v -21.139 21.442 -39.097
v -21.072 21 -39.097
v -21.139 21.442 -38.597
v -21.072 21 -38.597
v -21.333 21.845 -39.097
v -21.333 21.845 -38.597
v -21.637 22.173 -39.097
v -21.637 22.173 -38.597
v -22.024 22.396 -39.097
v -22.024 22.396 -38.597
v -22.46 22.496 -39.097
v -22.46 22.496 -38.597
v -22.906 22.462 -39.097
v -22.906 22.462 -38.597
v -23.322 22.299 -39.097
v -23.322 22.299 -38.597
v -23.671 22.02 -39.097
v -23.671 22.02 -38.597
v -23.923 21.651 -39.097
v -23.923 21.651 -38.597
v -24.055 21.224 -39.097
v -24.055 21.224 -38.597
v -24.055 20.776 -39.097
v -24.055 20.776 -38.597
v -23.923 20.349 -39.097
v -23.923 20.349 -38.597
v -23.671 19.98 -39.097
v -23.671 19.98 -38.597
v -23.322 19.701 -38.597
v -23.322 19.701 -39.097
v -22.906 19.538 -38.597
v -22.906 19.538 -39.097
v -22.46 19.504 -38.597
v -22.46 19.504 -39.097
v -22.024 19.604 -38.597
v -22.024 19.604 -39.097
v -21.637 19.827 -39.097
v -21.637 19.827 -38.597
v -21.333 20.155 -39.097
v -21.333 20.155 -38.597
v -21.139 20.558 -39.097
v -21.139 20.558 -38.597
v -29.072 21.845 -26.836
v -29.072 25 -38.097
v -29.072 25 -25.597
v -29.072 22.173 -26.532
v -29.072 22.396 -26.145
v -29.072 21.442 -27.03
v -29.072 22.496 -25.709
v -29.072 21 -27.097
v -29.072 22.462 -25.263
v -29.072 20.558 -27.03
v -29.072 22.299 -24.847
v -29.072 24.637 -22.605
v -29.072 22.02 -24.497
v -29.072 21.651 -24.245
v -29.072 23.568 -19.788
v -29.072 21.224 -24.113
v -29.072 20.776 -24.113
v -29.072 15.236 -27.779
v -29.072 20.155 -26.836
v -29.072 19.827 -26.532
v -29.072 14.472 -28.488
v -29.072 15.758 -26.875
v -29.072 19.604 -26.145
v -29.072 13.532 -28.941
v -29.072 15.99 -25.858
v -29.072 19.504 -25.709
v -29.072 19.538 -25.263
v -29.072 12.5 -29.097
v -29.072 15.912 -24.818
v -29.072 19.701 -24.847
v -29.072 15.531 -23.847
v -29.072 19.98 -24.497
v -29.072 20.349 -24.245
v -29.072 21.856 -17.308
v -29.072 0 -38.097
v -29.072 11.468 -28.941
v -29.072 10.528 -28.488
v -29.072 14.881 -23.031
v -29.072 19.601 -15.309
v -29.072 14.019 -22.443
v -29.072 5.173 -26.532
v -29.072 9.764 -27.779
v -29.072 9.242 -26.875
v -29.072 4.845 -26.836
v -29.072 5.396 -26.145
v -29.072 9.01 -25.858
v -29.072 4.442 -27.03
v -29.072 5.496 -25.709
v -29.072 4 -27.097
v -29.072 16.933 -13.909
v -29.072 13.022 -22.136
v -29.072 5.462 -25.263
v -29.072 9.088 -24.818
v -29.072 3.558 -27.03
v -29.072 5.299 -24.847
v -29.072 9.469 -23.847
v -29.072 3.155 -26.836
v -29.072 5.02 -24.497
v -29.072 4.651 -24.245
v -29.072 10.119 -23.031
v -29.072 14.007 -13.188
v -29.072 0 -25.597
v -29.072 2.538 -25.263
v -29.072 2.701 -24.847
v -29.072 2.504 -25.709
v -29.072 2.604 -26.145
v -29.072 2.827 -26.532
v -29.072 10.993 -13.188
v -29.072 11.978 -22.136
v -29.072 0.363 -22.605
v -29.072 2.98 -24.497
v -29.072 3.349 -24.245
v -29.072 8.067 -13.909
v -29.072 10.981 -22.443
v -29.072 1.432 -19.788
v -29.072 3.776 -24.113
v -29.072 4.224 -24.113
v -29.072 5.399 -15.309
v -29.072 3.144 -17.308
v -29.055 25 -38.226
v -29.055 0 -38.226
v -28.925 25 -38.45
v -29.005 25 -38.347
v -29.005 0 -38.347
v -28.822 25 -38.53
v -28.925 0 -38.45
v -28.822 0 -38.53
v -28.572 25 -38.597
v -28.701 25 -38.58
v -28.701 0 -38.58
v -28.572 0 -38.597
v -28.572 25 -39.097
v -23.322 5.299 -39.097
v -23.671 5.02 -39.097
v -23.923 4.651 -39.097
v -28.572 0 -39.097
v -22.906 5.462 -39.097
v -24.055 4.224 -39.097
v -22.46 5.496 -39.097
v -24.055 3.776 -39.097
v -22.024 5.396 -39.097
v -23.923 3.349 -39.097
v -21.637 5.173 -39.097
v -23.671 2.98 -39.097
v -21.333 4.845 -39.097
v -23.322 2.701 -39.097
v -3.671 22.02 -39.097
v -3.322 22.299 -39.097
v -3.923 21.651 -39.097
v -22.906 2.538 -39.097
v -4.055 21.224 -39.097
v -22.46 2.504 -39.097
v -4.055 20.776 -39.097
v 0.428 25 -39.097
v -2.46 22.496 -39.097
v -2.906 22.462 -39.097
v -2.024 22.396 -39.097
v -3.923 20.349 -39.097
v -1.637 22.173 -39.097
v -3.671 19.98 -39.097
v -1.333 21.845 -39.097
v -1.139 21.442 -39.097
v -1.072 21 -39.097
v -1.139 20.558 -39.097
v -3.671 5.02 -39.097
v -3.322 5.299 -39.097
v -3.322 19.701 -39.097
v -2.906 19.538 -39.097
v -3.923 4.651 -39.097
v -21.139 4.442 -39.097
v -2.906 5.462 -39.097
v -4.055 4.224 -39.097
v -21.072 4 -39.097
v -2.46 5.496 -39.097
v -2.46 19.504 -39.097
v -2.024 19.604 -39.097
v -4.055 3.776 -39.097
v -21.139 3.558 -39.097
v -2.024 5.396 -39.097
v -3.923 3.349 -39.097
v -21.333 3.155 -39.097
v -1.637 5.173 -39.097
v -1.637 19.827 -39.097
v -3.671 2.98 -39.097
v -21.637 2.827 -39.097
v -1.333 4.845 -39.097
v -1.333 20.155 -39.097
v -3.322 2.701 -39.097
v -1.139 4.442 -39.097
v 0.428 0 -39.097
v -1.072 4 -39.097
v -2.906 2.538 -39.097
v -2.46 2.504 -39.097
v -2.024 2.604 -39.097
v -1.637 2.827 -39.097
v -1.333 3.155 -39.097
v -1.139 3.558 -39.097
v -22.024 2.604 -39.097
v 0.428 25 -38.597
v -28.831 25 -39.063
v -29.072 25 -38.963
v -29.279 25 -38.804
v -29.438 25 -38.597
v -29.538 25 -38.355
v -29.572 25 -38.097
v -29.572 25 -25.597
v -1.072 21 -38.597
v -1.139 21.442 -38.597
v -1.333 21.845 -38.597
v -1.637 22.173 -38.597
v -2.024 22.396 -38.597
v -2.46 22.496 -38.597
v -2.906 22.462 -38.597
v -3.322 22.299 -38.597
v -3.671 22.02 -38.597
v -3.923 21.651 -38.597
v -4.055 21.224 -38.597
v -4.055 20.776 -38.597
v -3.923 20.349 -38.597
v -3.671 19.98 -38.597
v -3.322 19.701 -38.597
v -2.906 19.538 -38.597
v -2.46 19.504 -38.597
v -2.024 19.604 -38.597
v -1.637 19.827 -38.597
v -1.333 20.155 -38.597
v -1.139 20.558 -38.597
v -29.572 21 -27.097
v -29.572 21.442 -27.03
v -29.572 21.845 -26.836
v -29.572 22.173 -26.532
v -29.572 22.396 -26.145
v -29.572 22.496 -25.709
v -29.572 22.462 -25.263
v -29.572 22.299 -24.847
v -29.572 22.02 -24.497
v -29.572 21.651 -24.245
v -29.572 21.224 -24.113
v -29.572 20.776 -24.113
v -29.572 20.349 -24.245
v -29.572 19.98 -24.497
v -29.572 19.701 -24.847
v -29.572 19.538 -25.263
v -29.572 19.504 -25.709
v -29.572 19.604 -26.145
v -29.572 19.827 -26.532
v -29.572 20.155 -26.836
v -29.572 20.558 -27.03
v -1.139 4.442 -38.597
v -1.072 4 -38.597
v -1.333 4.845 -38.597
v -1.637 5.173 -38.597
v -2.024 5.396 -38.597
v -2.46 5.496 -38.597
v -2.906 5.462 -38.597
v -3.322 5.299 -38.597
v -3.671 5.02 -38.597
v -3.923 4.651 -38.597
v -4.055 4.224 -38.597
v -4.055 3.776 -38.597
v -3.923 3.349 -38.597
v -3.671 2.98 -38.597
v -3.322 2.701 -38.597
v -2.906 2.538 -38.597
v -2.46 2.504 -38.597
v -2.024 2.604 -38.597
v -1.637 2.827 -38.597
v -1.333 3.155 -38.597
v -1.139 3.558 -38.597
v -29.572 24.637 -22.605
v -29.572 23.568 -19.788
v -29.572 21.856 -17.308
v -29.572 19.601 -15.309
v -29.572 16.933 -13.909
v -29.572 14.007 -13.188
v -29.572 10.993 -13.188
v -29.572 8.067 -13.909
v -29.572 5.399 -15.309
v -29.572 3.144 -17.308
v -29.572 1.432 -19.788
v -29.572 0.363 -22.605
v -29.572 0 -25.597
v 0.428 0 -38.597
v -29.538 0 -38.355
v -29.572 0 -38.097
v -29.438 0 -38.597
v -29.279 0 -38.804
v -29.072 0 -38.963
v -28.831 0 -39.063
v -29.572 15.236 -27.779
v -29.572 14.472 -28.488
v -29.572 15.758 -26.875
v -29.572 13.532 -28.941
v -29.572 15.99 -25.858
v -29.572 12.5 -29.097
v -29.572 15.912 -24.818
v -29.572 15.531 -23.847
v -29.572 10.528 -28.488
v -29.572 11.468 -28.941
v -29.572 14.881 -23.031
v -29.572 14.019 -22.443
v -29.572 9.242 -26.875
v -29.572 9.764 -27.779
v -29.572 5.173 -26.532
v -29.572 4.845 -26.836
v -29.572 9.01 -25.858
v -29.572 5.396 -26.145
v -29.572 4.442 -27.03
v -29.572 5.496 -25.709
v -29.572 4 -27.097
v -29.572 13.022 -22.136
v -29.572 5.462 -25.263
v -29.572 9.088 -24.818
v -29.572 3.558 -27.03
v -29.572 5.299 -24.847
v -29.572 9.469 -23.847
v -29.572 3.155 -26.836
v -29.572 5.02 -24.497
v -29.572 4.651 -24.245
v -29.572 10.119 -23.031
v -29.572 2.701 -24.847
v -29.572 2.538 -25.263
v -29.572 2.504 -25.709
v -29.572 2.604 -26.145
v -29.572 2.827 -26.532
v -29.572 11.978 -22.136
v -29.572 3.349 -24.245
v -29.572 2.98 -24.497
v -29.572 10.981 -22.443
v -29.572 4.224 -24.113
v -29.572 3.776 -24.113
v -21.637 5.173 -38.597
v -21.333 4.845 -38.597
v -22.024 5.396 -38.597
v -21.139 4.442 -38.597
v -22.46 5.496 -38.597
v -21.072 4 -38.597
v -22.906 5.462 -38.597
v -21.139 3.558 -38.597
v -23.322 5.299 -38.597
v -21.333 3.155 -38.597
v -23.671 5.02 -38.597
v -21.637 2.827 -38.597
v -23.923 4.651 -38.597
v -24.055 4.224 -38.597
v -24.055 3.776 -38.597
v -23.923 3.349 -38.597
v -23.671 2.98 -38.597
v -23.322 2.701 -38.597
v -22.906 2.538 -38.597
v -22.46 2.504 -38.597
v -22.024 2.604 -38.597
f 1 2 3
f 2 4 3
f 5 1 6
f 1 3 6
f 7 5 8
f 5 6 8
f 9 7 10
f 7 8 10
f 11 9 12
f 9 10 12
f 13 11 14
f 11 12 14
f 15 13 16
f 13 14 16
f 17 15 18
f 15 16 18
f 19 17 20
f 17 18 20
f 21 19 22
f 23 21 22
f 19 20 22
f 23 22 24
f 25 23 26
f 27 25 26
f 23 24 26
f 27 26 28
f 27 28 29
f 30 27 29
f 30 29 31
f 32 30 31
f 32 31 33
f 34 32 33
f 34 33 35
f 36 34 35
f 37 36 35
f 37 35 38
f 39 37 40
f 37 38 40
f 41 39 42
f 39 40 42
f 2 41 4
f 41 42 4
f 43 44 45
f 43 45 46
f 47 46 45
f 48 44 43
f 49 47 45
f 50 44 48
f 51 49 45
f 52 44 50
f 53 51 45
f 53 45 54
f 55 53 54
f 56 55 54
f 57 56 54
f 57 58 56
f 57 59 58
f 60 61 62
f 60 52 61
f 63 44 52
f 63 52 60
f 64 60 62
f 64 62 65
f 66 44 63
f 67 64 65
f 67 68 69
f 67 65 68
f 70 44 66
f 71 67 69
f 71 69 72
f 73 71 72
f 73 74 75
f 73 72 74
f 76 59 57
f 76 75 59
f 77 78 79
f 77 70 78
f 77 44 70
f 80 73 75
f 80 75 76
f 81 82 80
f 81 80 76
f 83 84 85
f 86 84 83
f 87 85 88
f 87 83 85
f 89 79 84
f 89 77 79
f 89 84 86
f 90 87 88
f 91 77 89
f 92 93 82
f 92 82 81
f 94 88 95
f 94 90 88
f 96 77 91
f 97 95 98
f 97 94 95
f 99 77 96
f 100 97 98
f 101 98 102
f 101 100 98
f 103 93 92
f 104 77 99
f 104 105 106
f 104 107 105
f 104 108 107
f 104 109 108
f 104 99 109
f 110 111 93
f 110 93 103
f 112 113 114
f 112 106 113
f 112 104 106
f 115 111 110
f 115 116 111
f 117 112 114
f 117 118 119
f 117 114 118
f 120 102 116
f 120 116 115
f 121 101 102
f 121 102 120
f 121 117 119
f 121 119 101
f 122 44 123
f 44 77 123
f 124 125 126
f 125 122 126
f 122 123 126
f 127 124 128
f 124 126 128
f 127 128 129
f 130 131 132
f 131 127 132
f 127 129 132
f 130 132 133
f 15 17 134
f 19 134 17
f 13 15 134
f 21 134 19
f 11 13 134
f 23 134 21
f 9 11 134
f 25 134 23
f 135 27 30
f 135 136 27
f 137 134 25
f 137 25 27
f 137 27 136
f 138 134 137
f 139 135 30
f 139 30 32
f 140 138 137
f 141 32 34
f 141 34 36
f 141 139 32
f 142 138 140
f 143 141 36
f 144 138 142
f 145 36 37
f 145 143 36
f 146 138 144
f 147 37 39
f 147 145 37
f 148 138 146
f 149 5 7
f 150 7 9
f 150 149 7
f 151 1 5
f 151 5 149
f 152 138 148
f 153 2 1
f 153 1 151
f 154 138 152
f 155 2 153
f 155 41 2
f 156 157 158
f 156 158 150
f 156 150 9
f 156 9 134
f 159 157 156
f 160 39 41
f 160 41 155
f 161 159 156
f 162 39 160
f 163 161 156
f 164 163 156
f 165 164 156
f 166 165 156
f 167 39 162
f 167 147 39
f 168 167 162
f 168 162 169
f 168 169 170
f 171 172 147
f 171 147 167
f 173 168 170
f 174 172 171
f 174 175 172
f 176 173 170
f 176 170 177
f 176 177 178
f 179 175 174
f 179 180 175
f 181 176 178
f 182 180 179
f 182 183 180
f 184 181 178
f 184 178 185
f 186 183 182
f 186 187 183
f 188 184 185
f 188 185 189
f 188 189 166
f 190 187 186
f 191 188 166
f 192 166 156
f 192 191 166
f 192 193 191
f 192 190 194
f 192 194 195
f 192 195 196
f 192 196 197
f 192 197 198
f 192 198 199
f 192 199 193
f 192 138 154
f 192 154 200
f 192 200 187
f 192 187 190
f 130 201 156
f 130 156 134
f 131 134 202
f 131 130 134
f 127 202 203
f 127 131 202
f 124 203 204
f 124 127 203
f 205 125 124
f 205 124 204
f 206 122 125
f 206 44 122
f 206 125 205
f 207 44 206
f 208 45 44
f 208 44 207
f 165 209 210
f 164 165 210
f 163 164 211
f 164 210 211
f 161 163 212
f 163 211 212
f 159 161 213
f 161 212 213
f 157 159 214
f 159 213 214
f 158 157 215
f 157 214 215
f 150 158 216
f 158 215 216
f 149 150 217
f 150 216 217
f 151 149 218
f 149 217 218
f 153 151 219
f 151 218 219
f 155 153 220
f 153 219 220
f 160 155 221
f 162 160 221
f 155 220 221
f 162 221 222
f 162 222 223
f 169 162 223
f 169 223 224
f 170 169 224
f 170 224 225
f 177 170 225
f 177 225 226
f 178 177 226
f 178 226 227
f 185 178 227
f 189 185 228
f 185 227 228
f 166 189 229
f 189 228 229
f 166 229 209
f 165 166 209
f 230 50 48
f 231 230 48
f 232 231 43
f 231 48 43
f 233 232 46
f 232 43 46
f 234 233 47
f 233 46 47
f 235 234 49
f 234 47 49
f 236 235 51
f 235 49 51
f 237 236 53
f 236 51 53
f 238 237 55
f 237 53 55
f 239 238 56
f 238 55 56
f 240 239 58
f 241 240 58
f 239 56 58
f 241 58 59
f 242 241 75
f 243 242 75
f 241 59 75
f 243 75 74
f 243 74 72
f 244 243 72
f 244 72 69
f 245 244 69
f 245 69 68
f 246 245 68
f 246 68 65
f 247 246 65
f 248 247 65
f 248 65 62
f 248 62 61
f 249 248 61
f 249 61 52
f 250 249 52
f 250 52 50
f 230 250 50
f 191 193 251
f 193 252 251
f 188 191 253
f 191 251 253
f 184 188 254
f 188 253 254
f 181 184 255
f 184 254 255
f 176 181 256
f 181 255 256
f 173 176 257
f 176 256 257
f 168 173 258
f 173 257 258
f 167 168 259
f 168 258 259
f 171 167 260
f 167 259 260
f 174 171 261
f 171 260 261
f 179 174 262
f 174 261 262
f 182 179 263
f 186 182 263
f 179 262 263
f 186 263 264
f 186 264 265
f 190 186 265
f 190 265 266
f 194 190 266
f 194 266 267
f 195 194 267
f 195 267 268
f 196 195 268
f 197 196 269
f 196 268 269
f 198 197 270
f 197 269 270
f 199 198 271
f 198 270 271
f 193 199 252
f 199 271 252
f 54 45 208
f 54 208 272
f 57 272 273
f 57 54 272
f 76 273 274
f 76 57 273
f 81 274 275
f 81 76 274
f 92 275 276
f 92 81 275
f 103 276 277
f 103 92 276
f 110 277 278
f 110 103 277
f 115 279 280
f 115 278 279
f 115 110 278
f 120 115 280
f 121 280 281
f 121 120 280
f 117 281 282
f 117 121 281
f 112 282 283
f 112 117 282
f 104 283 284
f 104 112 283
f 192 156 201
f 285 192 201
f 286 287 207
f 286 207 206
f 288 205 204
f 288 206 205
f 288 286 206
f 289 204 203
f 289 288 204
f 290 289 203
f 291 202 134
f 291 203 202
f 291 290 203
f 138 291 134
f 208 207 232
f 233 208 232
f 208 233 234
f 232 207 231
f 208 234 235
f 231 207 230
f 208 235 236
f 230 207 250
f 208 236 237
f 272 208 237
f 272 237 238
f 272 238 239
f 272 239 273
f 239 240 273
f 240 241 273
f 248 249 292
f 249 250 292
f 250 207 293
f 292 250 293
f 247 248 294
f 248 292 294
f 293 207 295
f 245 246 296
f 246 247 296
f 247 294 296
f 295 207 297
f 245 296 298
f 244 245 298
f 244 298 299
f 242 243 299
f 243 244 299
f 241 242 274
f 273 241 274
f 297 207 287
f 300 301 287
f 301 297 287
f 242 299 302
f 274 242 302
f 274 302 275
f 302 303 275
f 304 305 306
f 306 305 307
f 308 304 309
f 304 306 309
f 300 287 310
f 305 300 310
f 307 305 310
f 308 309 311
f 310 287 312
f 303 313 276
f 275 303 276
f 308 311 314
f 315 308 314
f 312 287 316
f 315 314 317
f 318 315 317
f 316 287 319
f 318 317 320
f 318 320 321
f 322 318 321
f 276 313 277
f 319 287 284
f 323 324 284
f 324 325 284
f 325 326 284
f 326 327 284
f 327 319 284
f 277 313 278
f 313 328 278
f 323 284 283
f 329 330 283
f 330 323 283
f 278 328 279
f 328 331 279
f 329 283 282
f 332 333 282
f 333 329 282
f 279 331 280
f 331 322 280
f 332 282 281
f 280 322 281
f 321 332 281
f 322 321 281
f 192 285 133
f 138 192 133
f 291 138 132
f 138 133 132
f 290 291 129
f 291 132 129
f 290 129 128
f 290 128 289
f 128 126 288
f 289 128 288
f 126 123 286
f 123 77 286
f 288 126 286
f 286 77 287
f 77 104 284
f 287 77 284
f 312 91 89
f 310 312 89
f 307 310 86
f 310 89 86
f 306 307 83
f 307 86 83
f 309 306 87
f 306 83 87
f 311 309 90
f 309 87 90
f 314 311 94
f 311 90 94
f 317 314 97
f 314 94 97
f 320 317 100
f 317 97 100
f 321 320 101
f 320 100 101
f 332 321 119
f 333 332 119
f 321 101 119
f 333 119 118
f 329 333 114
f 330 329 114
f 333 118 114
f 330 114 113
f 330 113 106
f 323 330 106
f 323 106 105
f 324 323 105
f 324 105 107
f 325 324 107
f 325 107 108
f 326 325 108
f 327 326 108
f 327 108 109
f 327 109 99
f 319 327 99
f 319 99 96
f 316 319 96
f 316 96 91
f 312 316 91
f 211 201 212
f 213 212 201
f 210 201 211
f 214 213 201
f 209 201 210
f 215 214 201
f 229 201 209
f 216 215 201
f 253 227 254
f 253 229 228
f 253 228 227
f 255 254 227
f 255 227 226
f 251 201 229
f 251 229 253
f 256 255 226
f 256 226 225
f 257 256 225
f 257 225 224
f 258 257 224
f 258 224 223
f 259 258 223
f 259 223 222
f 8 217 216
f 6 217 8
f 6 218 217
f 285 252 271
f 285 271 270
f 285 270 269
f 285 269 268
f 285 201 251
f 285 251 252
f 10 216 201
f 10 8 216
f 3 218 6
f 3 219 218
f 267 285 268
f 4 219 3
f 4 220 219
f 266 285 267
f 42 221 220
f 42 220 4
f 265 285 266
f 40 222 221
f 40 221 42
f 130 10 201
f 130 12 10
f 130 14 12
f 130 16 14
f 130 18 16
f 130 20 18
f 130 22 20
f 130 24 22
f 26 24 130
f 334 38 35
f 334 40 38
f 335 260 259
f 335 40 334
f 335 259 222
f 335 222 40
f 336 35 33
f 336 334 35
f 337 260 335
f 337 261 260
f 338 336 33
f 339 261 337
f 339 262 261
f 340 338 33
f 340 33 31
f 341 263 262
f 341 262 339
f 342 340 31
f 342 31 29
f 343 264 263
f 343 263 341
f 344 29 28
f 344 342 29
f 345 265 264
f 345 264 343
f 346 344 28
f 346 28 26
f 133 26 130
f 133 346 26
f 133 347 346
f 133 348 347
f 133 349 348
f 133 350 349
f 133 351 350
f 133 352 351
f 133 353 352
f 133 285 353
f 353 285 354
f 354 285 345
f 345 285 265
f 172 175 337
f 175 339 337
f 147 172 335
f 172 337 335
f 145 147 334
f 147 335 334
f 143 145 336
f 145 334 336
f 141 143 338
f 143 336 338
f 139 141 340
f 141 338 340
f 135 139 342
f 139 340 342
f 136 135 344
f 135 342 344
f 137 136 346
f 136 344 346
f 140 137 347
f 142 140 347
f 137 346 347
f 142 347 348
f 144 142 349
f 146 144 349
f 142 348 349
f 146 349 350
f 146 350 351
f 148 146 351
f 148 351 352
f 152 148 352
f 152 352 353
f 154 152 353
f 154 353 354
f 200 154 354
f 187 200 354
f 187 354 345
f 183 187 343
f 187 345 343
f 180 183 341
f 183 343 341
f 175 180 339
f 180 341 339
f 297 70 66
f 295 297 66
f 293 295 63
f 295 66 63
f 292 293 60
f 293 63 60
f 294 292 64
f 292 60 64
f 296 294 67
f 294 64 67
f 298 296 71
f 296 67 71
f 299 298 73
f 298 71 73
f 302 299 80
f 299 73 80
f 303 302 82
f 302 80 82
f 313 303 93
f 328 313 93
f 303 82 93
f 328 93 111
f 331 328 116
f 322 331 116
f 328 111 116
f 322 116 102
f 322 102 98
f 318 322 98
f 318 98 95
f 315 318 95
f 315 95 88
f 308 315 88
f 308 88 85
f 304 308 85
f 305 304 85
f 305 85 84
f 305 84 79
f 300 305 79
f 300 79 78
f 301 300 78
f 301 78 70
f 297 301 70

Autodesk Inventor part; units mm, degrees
ref_plane "YZ Plane" through (0, 0, 0) normal (1, 0, 0) x (0, 1, 0)
ref_plane "XZ Plane" through (0, 0, 0) normal (0, 1, 0) x (-1, 0, 0)
ref_plane "XY Plane" through (0, 0, 0) normal (0, 0, 1) x (1, 0, 0)
sketch "草圖1" plane through (0, 0, 0) normal (0, 1, 0) x (-1, 0, 0)
  line L0 (29.5719, -39.0966) -> (29.5719, -13.0966)
  line L1 (29.5719, -39.0966) -> (-0.4281, -39.0966)
  point P0 (0, 0)
  dimension "d0" = 26
  dimension "d2" = 90
  dimension "d3" = 30
contour flange "輪廓線凸緣1" sketch "草圖1" thickness 0.5 bend radius 0.5 width 25 along (0, 1, 0) mid plane no both sides no wall seen from (-29.5719, 0, -26.0966) lies toward (1, 0, 0) curves L0 L1
bend "折彎1"
corner "轉角1"
sketch "草圖2" plane through (-29.0719, 0, -13.0966) normal (1, 0, 0) x (0, 0, -1)
  circle A0 centre (12.5, 12.5) radius 12.5
  line L0 (0, 25) -> (25, 25) projected
  line L1 (0, 0) -> (0, 25) projected
  line L2 (0, 0) -> (25, 0) projected
  point P0 (-13.0966, 0)
  point P1 (0, 12.5)
  point P2 (12.5, 25)
  point P3 (12.5, 0)
  dimension "d15" = 25
extrude "擠出1" cut sketch "草圖2" against normal up to surface (0.5 mm away) contours A0 L1 L0 | L2 L1 A0
sketch "草圖3" plane through (-29.0719, 0, -38.0966) normal (1, 0, 0) x (0, 0, -1)
  arc A0 (-12.5, 25) -> (-12.5, 0) centre (-12.5, 12.5) ccw projected
  circle A1 centre (-12.5, 21) radius 1.5
  circle A2 centre (-12.5, 4) radius 1.5
  point P0 (-38.0966, 0)
  dimension "d18" = 3
  dimension "d19" = 17
  dimension "d20" = 8.5
  dimension "d21" = 3
extrude "擠出2" cut sketch "草圖3" against normal up to surface (0.5 mm away)
sketch "草圖4" plane through (0.4281, 0, -38.5966) normal (0, 0, 1) x (1, 0, 0)
  circle A0 centre (-23, 21) radius 1.5
  circle A1 centre (-3, 21) radius 1.5
  circle A2 centre (-23, 4) radius 1.5
  circle A3 centre (-3, 4) radius 1.5
  line L0 (0, 0) -> (0, 25) projected
  line L1 (-3, 21) -> (-3, 4)
  line L2 (-3, 12.5) -> (-13.1347, 12.5)
  line L3 (-29, 25) -> (0, 25) projected
  point P0 (-0.4281, 0)
  dimension "d24" = 20
  dimension "d25" = 3
  dimension "d26" = 3
  dimension "d27" = 3
  dimension "d28" = 3
  dimension "d29" = 17
  dimension "d30" = 3
  dimension "d31" = 12.5
extrude "擠出3" cut sketch "草圖4" against normal up to surface (0.5 mm away)
sketch "草圖5" plane through (-29.0719, 0, -38.0966) normal (1, 0, 0) x (0, 0, -1)
  arc A0 (-12.5, 25) -> (-12.5, 0) centre (-12.5, 12.5) ccw projected
  circle A1 centre (-12.5, 12.5) radius 3.5
  point P0 (-38.0966, 0)
  dimension "d34" = 7
extrude "擠出4" cut sketch "草圖5" against normal up to surface (0.5 mm away)
equation "\"d4\" = 厚度"
equation "\"d5\" = 折彎離隙寬度"
equation "\"d6\" = 折彎離隙深度"
equation "\"d7\" = 最小剩餘"
equation "\"d8\" = 轉移半徑"
equation "\"d10\" = 折彎半徑"
equation "\"d12\" = 轉角離隙大小"
equation "\"d13\" = 間隙大小"
equation "\"d14\" = Jacobi半徑大小"
equation "\"折彎半徑\" = 厚度"
equation "\"折彎離隙寬度\" = 厚度"
equation "\"折彎離隙深度\" = 0.5 * 厚度"
equation "\"轉角離隙大小\" = 4 * 厚度"
equation "\"最小剩餘\" = 2 * 厚度"
equation "\"轉移半徑\" = 折彎半徑"
equation "\"Jacobi半徑大小\" = 折彎半徑"
equation "\"間隙大小\" = 厚度"
equation "\"厚度\" = 0.5"
properties part number "motor_base"
